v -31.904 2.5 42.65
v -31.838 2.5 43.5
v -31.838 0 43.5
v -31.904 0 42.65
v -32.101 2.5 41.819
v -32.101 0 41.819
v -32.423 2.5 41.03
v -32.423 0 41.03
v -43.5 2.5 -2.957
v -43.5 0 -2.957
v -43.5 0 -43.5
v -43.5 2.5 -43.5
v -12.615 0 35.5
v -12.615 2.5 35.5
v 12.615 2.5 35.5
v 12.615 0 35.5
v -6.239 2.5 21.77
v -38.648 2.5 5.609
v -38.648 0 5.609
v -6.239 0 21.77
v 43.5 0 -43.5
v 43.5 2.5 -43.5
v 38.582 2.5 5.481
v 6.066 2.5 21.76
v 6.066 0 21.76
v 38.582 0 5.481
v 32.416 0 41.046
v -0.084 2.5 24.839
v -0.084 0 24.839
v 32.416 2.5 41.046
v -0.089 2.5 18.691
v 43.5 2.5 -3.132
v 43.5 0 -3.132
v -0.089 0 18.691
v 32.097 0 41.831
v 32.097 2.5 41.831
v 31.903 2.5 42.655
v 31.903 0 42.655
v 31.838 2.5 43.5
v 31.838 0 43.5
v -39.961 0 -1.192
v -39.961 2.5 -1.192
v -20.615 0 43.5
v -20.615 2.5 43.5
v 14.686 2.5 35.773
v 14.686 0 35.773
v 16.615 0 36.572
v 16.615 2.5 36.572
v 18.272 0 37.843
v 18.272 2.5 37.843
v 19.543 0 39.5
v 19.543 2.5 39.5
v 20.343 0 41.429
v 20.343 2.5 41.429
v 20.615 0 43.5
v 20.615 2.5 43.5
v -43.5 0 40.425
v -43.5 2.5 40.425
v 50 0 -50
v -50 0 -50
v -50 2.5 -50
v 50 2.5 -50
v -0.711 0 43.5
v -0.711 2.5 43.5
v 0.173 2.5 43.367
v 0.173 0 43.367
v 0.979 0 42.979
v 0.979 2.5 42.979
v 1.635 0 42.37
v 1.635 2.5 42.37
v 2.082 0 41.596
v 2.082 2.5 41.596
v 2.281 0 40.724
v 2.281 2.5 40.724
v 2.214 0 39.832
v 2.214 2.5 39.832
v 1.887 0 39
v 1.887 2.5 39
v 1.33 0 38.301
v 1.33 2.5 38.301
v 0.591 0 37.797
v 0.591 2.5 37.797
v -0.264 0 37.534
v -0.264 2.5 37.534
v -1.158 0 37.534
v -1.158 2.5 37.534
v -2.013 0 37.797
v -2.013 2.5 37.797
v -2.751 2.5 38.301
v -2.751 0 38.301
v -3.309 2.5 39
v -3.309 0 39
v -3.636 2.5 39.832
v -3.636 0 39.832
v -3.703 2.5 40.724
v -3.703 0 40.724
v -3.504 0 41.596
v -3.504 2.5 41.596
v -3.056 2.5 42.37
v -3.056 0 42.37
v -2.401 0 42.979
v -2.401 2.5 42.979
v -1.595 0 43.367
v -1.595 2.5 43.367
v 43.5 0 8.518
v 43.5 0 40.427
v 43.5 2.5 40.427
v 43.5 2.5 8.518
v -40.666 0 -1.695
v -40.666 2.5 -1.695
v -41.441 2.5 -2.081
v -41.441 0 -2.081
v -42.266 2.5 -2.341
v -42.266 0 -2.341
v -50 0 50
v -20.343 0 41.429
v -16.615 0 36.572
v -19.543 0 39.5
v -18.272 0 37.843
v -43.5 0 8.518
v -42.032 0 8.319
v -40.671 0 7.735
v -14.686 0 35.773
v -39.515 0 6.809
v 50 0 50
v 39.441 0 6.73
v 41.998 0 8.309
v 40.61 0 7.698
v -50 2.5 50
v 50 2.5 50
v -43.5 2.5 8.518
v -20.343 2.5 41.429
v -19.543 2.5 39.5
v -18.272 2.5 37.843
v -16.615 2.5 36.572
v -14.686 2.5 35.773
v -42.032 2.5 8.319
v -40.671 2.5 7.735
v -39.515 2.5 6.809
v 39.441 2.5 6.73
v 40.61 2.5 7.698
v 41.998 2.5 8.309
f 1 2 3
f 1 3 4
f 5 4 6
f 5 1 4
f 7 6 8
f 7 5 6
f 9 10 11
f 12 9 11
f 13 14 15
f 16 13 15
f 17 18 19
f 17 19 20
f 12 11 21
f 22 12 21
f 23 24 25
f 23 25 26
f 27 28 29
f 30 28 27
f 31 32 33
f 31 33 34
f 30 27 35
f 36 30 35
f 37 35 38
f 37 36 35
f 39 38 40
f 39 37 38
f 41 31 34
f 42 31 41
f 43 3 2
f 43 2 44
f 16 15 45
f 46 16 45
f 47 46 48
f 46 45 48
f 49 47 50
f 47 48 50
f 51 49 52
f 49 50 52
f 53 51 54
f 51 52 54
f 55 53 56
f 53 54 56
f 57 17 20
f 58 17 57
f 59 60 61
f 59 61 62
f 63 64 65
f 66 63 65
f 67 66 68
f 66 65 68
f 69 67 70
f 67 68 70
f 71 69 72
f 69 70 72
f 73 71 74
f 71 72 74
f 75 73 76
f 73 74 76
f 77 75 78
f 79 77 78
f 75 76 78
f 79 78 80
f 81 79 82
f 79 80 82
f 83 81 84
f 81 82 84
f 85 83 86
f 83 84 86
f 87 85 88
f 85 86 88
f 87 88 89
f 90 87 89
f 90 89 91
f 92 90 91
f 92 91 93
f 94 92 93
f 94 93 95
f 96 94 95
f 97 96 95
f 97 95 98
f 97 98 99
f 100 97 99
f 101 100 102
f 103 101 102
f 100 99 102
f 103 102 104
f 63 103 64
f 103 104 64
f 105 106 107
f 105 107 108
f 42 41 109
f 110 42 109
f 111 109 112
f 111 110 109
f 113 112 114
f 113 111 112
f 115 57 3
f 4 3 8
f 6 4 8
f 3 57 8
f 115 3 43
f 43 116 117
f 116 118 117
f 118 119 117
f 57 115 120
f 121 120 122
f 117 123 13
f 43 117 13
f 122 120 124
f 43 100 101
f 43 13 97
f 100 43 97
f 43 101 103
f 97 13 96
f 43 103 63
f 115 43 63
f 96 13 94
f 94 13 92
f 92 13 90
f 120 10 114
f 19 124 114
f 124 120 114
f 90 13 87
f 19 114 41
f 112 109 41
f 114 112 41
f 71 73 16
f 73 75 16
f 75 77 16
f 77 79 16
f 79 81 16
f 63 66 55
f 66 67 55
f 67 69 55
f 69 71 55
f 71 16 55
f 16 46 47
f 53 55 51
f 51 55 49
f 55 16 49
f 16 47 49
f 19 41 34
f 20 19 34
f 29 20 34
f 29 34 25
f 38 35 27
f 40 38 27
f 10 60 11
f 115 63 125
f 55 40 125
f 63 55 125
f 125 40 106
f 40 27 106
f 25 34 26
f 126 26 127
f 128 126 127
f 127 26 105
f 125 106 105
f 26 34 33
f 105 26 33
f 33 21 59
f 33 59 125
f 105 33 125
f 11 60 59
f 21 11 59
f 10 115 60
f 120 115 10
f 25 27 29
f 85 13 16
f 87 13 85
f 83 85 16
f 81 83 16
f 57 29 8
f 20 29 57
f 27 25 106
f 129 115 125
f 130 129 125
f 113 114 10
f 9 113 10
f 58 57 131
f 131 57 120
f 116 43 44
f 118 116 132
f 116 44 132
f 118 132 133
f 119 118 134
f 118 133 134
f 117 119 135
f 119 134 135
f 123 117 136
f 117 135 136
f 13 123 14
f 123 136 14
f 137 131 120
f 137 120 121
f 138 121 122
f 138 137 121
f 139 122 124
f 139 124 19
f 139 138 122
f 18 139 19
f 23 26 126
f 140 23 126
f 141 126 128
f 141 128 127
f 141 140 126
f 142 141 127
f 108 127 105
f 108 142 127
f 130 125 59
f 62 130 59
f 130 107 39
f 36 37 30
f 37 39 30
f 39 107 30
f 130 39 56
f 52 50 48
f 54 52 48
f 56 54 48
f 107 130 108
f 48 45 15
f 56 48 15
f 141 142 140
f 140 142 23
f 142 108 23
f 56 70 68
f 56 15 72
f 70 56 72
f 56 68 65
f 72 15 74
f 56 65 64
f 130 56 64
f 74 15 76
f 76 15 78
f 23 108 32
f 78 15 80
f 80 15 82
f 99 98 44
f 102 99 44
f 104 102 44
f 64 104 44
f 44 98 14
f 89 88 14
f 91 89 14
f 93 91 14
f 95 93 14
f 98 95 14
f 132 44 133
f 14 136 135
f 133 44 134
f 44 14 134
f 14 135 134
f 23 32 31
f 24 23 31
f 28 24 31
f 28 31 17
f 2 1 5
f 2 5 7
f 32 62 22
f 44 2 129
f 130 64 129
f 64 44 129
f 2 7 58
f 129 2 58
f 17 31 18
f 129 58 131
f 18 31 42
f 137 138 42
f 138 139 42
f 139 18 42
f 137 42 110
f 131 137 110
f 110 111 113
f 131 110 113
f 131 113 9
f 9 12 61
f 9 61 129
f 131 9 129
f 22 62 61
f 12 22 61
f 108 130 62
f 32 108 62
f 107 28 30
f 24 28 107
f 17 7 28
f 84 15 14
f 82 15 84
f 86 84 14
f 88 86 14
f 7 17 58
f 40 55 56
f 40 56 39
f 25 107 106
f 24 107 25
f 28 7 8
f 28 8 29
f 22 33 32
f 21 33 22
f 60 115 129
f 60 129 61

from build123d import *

# Parameters (mm, degrees)
SKETCH1_W           = 100
SKETCH1_H           = 100
SKETCH1_W_2         = 87
SKETCH1_H_2         = 87
BOSS_EXTRUDE1_DEPTH = 2.5
BOSS_EXTRUDE2_DEPTH = 2.5
SKETCH3_W           = 52.284767499
SKETCH3_H           = 7.135478262
CUT_EXTRUDE1_DEPTH  = 2.5
SKETCH4_R           = 3
CUT_EXTRUDE2_DEPTH  = 2.5
EXTRUDE_THIN2_DEPTH = 2.5
SKETCH6_R           = 5.5
BOSS_EXTRUDE3_DEPTH = 2.5


with BuildPart() as part:
    # Sketch1 → Boss-Extrude1 (new body)
    with BuildSketch(Plane(origin=(0, 0, 0), x_dir=(1, 0, 0), z_dir=(0, 1, 0))):
        Rectangle(SKETCH1_W, SKETCH1_H)
        Rectangle(SKETCH1_W_2, SKETCH1_H_2, mode=Mode.SUBTRACT)
    extrude(amount=BOSS_EXTRUDE1_DEPTH)

    # Sketch2 → Boss-Extrude2 (add)
    with BuildSketch(Plane(origin=(0, 2.5, 0), x_dir=(1, 0, 0), z_dir=(0, 1, 0))):
        with BuildLine():
            Line((-12.615137118, -35.5), (12.615137118, -35.5))
            ThreePointArc((12.615137118, -35.5), (20.615137118, -43.5), (12.615137118, -51.5))
            Line((12.615137118, -51.5), (-12.615137118, -51.5))
            ThreePointArc((-12.615137118, -51.5), (-20.615137118, -43.5), (-12.615137118, -35.5))
        make_face()
    extrude(amount=-BOSS_EXTRUDE2_DEPTH)

    # Sketch3 → Cut-Extrude1 (cut)
    with BuildSketch(Plane(origin=(0, 2.5, 0), x_dir=(1, 0, 0), z_dir=(0, 1, 0))):
        with Locations((-0.902498863, -53.567739131)):
            Rectangle(SKETCH3_W, SKETCH3_H)
    extrude(amount=-CUT_EXTRUDE1_DEPTH, mode=Mode.SUBTRACT)

    # Sketch4 → Cut-Extrude2 (cut)
    with BuildSketch(Plane(origin=(0, 2.5, 0), x_dir=(1, 0, 0), z_dir=(0, 1, 0))):
        with Locations(Location((-0.710916126, -40.5, 0), (0, 0, 270))):
            Circle(SKETCH4_R)
    extrude(amount=-CUT_EXTRUDE2_DEPTH, mode=Mode.SUBTRACT)

    # Sketch5 → Extrude-Thin2 (add)
    with BuildSketch(Plane(origin=(0, 2.5, 0), x_dir=(1, 0, 0), z_dir=(0, 1, 0))):
        Polygon((-42.268876098, -45.959031097), (48.231095848, -0.649852738), (45.768848044, 4.268209457), (-44.731123902, -41.040968903), align=None)
        Polygon((44.727203432, -41.039010009), (-46.134206752, 4.270168351), (-48.588613617, -0.651811631), (42.272796568, -45.960989991), align=None)
    extrude(amount=-EXTRUDE_THIN2_DEPTH)

    # Sketch6 → Boss-Extrude3 (add)
    with BuildSketch(Plane(origin=(0, 2.5, 0), x_dir=(1, 0, 0), z_dir=(0, 1, 0))):
        with Locations((37.337615019, -43.5)):
            Circle(SKETCH6_R)
        with Locations((43.5, -3.018495081)):
            Circle(SKETCH6_R)
        with Locations((-37.337615019, -43.5)):
            Circle(SKETCH6_R)
        with Locations((-43.5, -3.018495081)):
            Circle(SKETCH6_R)
    extrude(amount=-BOSS_EXTRUDE3_DEPTH)


solid = part.part
